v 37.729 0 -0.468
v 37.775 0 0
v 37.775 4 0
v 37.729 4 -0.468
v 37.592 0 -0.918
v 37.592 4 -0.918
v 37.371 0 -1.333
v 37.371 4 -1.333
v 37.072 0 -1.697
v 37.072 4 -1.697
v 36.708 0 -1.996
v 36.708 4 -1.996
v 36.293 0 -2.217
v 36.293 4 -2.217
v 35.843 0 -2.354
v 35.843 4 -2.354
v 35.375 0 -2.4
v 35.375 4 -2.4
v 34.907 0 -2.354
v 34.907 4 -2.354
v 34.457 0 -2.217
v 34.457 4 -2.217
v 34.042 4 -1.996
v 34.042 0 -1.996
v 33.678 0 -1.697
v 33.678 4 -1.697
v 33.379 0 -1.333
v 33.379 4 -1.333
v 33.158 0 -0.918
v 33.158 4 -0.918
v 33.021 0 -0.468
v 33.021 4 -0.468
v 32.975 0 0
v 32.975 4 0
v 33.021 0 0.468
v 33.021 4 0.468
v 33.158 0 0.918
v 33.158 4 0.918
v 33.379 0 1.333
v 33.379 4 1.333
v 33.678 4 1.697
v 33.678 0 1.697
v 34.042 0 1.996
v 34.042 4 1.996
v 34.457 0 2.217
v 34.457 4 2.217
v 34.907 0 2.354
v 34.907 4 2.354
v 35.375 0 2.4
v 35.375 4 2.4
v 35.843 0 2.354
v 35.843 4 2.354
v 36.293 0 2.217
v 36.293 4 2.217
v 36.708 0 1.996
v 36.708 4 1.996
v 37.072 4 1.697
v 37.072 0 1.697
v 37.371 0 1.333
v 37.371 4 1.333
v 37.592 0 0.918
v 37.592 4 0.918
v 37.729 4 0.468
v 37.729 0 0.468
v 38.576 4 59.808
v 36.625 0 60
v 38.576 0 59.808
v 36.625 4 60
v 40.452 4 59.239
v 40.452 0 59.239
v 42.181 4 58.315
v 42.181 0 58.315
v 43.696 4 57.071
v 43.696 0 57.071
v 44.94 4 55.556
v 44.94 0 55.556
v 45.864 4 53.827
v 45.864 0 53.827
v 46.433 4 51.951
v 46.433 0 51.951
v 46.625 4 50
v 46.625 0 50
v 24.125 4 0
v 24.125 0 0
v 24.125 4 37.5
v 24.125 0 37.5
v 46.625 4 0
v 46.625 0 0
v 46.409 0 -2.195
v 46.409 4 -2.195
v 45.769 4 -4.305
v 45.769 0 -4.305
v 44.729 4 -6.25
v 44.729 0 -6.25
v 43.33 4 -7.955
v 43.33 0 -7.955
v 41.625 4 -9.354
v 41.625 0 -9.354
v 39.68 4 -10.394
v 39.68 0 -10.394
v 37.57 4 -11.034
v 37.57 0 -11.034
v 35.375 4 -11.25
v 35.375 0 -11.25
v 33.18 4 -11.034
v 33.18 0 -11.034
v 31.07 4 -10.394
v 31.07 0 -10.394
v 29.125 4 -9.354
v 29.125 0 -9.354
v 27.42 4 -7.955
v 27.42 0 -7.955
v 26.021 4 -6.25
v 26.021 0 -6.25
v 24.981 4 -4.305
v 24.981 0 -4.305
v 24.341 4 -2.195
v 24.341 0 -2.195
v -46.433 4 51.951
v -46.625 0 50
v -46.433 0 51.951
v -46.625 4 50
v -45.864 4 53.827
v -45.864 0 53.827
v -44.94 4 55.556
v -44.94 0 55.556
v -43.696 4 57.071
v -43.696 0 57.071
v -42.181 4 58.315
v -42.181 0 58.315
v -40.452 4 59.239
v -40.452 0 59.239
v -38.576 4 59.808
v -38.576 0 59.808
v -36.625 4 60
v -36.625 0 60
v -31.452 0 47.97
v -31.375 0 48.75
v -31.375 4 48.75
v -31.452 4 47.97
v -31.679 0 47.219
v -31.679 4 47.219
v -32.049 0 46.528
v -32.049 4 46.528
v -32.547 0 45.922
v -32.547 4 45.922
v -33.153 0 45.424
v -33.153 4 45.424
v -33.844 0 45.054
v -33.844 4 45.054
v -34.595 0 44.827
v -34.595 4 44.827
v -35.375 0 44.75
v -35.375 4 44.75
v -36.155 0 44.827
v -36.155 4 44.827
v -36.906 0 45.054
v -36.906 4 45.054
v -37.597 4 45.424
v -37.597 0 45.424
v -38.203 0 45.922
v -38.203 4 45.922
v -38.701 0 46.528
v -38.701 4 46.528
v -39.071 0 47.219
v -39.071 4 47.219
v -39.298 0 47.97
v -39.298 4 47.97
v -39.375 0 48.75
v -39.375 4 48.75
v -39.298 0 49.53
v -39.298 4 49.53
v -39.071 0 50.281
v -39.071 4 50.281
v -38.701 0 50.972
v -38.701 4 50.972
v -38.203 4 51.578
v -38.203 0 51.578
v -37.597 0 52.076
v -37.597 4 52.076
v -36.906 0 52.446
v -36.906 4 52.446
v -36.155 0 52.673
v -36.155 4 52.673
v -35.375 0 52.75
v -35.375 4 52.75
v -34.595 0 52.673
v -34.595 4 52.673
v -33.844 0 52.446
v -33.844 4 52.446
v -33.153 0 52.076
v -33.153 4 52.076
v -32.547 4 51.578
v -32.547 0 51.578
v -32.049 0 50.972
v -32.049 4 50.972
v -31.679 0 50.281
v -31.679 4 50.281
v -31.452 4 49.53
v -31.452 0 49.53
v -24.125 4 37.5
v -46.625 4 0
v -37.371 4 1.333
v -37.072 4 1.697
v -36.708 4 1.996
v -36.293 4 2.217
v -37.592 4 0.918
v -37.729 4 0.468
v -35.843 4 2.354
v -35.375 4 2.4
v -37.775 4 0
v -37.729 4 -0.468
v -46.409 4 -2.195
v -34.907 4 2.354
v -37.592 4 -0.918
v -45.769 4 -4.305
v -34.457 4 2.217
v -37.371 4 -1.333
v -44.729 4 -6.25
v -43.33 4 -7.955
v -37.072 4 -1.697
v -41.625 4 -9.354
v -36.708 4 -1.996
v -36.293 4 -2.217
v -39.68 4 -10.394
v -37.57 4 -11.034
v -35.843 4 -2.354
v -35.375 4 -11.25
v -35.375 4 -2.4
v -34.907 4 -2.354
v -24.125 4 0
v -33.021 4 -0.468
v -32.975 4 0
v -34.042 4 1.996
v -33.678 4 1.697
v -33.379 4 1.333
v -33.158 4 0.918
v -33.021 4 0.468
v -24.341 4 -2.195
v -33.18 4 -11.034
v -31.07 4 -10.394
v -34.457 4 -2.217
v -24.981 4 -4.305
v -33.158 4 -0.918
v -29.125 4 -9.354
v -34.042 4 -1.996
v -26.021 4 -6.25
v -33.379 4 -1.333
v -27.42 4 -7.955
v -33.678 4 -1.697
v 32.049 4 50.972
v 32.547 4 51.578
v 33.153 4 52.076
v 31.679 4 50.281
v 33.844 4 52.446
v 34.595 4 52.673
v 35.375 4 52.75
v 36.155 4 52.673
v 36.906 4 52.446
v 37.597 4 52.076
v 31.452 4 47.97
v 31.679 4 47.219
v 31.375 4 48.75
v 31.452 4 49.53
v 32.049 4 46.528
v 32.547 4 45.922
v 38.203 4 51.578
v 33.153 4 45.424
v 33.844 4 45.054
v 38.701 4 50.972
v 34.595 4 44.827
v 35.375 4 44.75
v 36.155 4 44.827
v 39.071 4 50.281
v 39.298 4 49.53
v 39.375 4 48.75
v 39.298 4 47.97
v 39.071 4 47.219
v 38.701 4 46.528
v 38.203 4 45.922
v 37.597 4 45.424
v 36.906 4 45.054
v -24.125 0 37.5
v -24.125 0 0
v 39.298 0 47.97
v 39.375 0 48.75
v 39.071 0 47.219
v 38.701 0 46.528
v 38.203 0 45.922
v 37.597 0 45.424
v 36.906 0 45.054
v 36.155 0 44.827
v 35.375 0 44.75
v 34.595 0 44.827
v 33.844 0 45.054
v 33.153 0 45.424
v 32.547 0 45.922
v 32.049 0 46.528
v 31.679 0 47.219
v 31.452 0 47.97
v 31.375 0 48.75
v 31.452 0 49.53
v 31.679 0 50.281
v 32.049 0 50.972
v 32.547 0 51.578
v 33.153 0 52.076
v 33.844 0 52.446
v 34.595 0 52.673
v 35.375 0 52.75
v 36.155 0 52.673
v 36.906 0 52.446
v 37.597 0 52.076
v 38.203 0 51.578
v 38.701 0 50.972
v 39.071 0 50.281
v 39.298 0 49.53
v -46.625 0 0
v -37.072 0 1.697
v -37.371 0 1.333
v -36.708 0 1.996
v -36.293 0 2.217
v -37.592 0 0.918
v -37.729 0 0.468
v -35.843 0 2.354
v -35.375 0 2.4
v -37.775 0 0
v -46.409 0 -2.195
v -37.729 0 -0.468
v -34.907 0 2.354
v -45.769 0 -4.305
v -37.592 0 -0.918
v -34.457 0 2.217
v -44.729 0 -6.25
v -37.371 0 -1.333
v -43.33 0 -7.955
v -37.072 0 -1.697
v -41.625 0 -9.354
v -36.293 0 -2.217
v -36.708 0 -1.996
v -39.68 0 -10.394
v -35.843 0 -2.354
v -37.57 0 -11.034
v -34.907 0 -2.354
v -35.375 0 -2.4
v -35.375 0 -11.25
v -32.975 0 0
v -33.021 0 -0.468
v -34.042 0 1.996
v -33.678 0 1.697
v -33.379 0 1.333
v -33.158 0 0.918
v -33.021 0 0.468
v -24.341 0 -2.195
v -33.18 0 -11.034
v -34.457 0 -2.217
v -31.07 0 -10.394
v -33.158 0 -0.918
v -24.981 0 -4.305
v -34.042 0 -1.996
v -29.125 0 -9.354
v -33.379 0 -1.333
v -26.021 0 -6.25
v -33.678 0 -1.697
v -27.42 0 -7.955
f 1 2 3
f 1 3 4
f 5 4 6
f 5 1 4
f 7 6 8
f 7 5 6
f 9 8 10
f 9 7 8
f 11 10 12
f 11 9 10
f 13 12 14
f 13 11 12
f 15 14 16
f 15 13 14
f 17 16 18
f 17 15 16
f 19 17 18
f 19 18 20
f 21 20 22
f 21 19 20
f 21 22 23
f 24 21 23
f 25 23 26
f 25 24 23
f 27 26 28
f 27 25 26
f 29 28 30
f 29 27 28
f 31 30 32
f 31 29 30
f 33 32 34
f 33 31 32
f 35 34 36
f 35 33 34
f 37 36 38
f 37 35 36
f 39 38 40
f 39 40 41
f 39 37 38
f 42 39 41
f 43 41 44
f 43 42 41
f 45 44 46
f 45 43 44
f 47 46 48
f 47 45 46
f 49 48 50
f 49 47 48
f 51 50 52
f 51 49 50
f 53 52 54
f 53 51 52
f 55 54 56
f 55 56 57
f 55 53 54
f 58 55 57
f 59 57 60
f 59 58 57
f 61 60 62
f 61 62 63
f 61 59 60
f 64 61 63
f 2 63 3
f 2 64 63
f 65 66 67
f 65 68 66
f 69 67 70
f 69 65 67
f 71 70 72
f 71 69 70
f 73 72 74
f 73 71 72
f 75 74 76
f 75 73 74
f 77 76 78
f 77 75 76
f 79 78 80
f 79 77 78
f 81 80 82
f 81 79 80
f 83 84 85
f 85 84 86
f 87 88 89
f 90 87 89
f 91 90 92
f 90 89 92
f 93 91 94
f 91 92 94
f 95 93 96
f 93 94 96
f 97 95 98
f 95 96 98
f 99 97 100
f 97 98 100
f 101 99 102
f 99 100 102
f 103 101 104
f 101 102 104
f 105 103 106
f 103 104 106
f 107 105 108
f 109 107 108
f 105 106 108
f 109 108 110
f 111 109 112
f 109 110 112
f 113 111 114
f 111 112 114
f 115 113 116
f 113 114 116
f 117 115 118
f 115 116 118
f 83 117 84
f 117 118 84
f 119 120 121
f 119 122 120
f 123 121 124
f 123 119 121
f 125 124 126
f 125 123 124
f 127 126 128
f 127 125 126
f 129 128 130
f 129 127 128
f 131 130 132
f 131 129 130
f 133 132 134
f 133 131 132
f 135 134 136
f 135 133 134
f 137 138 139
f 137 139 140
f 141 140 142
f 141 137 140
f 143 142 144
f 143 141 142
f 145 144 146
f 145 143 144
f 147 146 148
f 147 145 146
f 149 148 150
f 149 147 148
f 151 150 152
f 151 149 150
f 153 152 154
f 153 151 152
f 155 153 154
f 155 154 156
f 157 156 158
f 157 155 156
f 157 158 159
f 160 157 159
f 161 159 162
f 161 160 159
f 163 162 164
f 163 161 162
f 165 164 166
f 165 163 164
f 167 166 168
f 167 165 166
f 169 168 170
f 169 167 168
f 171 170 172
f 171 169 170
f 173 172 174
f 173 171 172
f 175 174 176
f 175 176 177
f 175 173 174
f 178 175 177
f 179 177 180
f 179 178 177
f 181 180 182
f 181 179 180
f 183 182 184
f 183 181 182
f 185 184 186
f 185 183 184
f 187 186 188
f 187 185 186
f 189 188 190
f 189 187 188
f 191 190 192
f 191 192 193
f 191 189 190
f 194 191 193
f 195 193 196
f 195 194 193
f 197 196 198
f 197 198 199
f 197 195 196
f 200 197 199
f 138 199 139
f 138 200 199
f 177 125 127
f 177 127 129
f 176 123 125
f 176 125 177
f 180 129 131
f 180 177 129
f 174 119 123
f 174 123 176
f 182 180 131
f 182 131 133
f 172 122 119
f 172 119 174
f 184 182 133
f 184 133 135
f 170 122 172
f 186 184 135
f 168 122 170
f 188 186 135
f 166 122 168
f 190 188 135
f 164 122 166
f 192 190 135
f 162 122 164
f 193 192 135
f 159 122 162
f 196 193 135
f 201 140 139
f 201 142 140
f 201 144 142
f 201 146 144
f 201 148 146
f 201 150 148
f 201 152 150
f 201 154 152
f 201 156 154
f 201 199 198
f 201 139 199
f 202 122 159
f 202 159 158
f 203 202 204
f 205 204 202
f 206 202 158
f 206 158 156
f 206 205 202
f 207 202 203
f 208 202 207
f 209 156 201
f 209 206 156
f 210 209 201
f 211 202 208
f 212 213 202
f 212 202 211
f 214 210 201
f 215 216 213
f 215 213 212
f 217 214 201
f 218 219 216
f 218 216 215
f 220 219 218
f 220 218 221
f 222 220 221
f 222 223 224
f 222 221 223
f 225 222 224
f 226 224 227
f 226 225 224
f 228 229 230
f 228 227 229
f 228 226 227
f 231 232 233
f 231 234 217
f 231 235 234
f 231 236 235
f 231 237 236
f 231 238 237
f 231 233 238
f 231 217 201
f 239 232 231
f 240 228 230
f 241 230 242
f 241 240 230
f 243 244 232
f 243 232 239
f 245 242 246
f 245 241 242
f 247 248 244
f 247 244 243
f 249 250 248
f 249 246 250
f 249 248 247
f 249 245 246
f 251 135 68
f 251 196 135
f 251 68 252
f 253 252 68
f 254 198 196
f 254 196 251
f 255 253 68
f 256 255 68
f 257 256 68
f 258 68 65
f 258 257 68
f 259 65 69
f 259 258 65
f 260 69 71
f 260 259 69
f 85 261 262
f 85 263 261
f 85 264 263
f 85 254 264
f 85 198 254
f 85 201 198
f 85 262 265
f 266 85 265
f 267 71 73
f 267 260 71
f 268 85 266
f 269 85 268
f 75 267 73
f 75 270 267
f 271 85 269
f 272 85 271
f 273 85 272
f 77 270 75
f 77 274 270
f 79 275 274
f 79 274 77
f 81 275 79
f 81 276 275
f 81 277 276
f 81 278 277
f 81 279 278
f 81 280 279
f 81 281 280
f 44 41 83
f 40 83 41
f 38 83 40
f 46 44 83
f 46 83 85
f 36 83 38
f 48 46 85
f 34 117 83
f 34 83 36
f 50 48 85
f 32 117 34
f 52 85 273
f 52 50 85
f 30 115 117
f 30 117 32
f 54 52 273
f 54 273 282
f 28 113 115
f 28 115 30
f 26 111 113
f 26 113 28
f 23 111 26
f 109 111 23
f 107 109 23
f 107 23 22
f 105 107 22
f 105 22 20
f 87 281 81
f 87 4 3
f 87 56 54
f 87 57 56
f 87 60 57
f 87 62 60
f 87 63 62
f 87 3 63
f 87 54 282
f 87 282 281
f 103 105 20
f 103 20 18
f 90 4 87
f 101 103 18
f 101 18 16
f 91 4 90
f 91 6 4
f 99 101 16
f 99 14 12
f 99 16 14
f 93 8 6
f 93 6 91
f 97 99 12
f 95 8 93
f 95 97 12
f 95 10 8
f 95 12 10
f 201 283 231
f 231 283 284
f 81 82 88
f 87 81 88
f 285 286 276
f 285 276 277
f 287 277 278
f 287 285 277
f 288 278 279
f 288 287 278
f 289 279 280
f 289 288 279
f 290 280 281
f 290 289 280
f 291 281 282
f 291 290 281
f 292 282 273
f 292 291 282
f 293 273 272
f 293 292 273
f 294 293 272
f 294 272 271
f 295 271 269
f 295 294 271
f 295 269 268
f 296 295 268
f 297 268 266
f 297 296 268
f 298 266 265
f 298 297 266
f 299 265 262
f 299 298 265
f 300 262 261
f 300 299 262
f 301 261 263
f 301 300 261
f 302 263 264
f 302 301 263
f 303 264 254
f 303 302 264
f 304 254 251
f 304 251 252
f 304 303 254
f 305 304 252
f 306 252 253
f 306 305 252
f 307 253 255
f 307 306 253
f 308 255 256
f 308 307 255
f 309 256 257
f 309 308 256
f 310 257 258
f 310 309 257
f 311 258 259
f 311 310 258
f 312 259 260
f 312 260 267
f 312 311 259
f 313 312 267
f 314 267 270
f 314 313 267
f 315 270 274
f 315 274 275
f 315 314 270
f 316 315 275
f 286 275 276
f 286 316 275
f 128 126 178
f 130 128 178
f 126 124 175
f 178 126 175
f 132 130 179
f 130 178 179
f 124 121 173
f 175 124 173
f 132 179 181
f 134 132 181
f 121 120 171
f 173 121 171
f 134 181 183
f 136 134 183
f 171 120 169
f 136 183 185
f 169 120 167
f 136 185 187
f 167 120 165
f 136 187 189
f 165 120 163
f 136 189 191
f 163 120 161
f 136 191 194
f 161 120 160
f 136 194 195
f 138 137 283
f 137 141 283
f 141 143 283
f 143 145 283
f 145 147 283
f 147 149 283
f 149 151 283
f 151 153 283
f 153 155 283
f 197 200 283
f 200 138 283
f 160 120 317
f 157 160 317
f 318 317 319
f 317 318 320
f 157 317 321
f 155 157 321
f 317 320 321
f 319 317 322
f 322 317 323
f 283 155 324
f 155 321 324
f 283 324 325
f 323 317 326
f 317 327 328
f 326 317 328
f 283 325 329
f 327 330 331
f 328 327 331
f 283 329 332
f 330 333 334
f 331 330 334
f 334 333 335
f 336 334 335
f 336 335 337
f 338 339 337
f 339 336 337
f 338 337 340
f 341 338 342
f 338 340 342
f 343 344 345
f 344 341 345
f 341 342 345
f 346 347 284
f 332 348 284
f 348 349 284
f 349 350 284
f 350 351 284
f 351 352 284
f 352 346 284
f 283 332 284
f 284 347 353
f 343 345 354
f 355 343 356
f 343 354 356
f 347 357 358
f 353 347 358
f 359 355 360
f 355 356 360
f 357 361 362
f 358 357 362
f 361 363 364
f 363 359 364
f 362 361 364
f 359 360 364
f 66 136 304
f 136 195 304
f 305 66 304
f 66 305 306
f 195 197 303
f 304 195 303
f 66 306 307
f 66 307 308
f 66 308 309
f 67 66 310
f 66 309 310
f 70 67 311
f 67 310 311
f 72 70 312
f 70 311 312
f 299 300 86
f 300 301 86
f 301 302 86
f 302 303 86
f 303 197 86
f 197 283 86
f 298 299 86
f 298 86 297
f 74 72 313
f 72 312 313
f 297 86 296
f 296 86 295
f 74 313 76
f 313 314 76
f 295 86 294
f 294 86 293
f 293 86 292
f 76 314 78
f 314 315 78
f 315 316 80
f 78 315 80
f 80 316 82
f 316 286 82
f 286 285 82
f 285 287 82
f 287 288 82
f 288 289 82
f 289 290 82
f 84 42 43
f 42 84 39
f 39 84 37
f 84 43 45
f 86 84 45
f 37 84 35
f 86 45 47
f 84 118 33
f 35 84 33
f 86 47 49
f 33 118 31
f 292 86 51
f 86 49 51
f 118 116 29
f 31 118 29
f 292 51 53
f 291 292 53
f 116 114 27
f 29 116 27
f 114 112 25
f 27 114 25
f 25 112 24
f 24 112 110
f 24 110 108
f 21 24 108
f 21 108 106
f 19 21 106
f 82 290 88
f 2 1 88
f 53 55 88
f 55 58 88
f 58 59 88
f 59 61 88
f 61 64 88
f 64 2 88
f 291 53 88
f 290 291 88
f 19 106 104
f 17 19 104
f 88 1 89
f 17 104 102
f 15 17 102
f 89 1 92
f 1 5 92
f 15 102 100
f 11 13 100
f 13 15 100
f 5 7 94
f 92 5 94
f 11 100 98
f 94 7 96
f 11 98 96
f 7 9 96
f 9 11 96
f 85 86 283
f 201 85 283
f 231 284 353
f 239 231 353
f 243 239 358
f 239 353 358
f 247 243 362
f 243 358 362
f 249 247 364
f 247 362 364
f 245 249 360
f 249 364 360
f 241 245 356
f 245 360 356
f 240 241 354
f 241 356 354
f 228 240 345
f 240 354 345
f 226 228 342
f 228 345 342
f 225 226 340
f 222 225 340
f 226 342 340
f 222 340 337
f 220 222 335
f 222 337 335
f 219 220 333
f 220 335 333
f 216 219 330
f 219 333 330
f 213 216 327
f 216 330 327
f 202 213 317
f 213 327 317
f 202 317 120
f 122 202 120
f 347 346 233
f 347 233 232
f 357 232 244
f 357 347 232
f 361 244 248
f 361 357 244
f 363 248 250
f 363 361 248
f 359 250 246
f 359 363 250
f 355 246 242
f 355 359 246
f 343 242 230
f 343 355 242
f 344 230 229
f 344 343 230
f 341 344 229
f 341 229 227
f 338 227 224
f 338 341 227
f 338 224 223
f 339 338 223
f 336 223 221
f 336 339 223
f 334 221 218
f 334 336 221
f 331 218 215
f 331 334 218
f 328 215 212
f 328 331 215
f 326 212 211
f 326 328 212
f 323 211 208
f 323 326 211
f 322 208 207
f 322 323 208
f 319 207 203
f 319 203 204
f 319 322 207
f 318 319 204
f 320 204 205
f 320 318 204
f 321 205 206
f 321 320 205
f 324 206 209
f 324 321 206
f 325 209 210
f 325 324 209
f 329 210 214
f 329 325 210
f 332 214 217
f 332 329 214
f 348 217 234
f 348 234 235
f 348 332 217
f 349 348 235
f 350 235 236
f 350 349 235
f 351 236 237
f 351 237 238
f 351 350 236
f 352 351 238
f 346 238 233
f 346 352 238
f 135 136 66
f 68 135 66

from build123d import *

# Parameters (mm, degrees)
SKETCH1_R           = 4
SKETCH1_R_2         = 11.25
SKETCH1_R_3         = 2.4
BOSS_EXTRUDE1_DEPTH = 4
FILLET1_R           = 10


with BuildPart() as part:
    # Sketch1 → Boss-Extrude1 (new body)
    with BuildSketch(Plane(origin=(0, 0, 0), x_dir=(1, 0, 0), z_dir=(0, 1, 0))):
        with BuildLine():
            Line((-24.125, -37.5), (-24.125, 0))
            ThreePointArc((-24.125, 0), (-35.375, -11.25), (-46.625, 0))
            Line((-46.625, 0), (-46.625, -60))
            Line((-46.625, -60), (46.625, -60))
            Line((46.625, -60), (46.625, 0))
            ThreePointArc((46.625, 0), (35.375, -11.25), (24.125, 0))
            Line((24.125, 0), (24.125, -37.5))
            Line((24.125, -37.5), (-24.125, -37.5))
        make_face()
        with Locations((-35.375, -48.75)):
            Circle(SKETCH1_R, mode=Mode.SUBTRACT)
        with Locations((35.375, -48.75)):
            Circle(SKETCH1_R, mode=Mode.SUBTRACT)
        with Locations((-35.375, 0)):
            Circle(SKETCH1_R_2)
        with Locations((-35.375, 0)):
            Circle(SKETCH1_R_3, mode=Mode.SUBTRACT)
        with Locations((35.375, 0)):
            Circle(SKETCH1_R_2)
        with Locations((35.375, 0)):
            Circle(SKETCH1_R_3, mode=Mode.SUBTRACT)
    extrude(amount=BOSS_EXTRUDE1_DEPTH)

    # Fillet1
    fillet1_edges = [part.edges().sort_by_distance(p)[0] for p in [
        (46.625, 2, 60),
        (-46.625, 2, 60),
    ]]
    fillet(fillet1_edges, radius=FILLET1_R)


solid = part.part
